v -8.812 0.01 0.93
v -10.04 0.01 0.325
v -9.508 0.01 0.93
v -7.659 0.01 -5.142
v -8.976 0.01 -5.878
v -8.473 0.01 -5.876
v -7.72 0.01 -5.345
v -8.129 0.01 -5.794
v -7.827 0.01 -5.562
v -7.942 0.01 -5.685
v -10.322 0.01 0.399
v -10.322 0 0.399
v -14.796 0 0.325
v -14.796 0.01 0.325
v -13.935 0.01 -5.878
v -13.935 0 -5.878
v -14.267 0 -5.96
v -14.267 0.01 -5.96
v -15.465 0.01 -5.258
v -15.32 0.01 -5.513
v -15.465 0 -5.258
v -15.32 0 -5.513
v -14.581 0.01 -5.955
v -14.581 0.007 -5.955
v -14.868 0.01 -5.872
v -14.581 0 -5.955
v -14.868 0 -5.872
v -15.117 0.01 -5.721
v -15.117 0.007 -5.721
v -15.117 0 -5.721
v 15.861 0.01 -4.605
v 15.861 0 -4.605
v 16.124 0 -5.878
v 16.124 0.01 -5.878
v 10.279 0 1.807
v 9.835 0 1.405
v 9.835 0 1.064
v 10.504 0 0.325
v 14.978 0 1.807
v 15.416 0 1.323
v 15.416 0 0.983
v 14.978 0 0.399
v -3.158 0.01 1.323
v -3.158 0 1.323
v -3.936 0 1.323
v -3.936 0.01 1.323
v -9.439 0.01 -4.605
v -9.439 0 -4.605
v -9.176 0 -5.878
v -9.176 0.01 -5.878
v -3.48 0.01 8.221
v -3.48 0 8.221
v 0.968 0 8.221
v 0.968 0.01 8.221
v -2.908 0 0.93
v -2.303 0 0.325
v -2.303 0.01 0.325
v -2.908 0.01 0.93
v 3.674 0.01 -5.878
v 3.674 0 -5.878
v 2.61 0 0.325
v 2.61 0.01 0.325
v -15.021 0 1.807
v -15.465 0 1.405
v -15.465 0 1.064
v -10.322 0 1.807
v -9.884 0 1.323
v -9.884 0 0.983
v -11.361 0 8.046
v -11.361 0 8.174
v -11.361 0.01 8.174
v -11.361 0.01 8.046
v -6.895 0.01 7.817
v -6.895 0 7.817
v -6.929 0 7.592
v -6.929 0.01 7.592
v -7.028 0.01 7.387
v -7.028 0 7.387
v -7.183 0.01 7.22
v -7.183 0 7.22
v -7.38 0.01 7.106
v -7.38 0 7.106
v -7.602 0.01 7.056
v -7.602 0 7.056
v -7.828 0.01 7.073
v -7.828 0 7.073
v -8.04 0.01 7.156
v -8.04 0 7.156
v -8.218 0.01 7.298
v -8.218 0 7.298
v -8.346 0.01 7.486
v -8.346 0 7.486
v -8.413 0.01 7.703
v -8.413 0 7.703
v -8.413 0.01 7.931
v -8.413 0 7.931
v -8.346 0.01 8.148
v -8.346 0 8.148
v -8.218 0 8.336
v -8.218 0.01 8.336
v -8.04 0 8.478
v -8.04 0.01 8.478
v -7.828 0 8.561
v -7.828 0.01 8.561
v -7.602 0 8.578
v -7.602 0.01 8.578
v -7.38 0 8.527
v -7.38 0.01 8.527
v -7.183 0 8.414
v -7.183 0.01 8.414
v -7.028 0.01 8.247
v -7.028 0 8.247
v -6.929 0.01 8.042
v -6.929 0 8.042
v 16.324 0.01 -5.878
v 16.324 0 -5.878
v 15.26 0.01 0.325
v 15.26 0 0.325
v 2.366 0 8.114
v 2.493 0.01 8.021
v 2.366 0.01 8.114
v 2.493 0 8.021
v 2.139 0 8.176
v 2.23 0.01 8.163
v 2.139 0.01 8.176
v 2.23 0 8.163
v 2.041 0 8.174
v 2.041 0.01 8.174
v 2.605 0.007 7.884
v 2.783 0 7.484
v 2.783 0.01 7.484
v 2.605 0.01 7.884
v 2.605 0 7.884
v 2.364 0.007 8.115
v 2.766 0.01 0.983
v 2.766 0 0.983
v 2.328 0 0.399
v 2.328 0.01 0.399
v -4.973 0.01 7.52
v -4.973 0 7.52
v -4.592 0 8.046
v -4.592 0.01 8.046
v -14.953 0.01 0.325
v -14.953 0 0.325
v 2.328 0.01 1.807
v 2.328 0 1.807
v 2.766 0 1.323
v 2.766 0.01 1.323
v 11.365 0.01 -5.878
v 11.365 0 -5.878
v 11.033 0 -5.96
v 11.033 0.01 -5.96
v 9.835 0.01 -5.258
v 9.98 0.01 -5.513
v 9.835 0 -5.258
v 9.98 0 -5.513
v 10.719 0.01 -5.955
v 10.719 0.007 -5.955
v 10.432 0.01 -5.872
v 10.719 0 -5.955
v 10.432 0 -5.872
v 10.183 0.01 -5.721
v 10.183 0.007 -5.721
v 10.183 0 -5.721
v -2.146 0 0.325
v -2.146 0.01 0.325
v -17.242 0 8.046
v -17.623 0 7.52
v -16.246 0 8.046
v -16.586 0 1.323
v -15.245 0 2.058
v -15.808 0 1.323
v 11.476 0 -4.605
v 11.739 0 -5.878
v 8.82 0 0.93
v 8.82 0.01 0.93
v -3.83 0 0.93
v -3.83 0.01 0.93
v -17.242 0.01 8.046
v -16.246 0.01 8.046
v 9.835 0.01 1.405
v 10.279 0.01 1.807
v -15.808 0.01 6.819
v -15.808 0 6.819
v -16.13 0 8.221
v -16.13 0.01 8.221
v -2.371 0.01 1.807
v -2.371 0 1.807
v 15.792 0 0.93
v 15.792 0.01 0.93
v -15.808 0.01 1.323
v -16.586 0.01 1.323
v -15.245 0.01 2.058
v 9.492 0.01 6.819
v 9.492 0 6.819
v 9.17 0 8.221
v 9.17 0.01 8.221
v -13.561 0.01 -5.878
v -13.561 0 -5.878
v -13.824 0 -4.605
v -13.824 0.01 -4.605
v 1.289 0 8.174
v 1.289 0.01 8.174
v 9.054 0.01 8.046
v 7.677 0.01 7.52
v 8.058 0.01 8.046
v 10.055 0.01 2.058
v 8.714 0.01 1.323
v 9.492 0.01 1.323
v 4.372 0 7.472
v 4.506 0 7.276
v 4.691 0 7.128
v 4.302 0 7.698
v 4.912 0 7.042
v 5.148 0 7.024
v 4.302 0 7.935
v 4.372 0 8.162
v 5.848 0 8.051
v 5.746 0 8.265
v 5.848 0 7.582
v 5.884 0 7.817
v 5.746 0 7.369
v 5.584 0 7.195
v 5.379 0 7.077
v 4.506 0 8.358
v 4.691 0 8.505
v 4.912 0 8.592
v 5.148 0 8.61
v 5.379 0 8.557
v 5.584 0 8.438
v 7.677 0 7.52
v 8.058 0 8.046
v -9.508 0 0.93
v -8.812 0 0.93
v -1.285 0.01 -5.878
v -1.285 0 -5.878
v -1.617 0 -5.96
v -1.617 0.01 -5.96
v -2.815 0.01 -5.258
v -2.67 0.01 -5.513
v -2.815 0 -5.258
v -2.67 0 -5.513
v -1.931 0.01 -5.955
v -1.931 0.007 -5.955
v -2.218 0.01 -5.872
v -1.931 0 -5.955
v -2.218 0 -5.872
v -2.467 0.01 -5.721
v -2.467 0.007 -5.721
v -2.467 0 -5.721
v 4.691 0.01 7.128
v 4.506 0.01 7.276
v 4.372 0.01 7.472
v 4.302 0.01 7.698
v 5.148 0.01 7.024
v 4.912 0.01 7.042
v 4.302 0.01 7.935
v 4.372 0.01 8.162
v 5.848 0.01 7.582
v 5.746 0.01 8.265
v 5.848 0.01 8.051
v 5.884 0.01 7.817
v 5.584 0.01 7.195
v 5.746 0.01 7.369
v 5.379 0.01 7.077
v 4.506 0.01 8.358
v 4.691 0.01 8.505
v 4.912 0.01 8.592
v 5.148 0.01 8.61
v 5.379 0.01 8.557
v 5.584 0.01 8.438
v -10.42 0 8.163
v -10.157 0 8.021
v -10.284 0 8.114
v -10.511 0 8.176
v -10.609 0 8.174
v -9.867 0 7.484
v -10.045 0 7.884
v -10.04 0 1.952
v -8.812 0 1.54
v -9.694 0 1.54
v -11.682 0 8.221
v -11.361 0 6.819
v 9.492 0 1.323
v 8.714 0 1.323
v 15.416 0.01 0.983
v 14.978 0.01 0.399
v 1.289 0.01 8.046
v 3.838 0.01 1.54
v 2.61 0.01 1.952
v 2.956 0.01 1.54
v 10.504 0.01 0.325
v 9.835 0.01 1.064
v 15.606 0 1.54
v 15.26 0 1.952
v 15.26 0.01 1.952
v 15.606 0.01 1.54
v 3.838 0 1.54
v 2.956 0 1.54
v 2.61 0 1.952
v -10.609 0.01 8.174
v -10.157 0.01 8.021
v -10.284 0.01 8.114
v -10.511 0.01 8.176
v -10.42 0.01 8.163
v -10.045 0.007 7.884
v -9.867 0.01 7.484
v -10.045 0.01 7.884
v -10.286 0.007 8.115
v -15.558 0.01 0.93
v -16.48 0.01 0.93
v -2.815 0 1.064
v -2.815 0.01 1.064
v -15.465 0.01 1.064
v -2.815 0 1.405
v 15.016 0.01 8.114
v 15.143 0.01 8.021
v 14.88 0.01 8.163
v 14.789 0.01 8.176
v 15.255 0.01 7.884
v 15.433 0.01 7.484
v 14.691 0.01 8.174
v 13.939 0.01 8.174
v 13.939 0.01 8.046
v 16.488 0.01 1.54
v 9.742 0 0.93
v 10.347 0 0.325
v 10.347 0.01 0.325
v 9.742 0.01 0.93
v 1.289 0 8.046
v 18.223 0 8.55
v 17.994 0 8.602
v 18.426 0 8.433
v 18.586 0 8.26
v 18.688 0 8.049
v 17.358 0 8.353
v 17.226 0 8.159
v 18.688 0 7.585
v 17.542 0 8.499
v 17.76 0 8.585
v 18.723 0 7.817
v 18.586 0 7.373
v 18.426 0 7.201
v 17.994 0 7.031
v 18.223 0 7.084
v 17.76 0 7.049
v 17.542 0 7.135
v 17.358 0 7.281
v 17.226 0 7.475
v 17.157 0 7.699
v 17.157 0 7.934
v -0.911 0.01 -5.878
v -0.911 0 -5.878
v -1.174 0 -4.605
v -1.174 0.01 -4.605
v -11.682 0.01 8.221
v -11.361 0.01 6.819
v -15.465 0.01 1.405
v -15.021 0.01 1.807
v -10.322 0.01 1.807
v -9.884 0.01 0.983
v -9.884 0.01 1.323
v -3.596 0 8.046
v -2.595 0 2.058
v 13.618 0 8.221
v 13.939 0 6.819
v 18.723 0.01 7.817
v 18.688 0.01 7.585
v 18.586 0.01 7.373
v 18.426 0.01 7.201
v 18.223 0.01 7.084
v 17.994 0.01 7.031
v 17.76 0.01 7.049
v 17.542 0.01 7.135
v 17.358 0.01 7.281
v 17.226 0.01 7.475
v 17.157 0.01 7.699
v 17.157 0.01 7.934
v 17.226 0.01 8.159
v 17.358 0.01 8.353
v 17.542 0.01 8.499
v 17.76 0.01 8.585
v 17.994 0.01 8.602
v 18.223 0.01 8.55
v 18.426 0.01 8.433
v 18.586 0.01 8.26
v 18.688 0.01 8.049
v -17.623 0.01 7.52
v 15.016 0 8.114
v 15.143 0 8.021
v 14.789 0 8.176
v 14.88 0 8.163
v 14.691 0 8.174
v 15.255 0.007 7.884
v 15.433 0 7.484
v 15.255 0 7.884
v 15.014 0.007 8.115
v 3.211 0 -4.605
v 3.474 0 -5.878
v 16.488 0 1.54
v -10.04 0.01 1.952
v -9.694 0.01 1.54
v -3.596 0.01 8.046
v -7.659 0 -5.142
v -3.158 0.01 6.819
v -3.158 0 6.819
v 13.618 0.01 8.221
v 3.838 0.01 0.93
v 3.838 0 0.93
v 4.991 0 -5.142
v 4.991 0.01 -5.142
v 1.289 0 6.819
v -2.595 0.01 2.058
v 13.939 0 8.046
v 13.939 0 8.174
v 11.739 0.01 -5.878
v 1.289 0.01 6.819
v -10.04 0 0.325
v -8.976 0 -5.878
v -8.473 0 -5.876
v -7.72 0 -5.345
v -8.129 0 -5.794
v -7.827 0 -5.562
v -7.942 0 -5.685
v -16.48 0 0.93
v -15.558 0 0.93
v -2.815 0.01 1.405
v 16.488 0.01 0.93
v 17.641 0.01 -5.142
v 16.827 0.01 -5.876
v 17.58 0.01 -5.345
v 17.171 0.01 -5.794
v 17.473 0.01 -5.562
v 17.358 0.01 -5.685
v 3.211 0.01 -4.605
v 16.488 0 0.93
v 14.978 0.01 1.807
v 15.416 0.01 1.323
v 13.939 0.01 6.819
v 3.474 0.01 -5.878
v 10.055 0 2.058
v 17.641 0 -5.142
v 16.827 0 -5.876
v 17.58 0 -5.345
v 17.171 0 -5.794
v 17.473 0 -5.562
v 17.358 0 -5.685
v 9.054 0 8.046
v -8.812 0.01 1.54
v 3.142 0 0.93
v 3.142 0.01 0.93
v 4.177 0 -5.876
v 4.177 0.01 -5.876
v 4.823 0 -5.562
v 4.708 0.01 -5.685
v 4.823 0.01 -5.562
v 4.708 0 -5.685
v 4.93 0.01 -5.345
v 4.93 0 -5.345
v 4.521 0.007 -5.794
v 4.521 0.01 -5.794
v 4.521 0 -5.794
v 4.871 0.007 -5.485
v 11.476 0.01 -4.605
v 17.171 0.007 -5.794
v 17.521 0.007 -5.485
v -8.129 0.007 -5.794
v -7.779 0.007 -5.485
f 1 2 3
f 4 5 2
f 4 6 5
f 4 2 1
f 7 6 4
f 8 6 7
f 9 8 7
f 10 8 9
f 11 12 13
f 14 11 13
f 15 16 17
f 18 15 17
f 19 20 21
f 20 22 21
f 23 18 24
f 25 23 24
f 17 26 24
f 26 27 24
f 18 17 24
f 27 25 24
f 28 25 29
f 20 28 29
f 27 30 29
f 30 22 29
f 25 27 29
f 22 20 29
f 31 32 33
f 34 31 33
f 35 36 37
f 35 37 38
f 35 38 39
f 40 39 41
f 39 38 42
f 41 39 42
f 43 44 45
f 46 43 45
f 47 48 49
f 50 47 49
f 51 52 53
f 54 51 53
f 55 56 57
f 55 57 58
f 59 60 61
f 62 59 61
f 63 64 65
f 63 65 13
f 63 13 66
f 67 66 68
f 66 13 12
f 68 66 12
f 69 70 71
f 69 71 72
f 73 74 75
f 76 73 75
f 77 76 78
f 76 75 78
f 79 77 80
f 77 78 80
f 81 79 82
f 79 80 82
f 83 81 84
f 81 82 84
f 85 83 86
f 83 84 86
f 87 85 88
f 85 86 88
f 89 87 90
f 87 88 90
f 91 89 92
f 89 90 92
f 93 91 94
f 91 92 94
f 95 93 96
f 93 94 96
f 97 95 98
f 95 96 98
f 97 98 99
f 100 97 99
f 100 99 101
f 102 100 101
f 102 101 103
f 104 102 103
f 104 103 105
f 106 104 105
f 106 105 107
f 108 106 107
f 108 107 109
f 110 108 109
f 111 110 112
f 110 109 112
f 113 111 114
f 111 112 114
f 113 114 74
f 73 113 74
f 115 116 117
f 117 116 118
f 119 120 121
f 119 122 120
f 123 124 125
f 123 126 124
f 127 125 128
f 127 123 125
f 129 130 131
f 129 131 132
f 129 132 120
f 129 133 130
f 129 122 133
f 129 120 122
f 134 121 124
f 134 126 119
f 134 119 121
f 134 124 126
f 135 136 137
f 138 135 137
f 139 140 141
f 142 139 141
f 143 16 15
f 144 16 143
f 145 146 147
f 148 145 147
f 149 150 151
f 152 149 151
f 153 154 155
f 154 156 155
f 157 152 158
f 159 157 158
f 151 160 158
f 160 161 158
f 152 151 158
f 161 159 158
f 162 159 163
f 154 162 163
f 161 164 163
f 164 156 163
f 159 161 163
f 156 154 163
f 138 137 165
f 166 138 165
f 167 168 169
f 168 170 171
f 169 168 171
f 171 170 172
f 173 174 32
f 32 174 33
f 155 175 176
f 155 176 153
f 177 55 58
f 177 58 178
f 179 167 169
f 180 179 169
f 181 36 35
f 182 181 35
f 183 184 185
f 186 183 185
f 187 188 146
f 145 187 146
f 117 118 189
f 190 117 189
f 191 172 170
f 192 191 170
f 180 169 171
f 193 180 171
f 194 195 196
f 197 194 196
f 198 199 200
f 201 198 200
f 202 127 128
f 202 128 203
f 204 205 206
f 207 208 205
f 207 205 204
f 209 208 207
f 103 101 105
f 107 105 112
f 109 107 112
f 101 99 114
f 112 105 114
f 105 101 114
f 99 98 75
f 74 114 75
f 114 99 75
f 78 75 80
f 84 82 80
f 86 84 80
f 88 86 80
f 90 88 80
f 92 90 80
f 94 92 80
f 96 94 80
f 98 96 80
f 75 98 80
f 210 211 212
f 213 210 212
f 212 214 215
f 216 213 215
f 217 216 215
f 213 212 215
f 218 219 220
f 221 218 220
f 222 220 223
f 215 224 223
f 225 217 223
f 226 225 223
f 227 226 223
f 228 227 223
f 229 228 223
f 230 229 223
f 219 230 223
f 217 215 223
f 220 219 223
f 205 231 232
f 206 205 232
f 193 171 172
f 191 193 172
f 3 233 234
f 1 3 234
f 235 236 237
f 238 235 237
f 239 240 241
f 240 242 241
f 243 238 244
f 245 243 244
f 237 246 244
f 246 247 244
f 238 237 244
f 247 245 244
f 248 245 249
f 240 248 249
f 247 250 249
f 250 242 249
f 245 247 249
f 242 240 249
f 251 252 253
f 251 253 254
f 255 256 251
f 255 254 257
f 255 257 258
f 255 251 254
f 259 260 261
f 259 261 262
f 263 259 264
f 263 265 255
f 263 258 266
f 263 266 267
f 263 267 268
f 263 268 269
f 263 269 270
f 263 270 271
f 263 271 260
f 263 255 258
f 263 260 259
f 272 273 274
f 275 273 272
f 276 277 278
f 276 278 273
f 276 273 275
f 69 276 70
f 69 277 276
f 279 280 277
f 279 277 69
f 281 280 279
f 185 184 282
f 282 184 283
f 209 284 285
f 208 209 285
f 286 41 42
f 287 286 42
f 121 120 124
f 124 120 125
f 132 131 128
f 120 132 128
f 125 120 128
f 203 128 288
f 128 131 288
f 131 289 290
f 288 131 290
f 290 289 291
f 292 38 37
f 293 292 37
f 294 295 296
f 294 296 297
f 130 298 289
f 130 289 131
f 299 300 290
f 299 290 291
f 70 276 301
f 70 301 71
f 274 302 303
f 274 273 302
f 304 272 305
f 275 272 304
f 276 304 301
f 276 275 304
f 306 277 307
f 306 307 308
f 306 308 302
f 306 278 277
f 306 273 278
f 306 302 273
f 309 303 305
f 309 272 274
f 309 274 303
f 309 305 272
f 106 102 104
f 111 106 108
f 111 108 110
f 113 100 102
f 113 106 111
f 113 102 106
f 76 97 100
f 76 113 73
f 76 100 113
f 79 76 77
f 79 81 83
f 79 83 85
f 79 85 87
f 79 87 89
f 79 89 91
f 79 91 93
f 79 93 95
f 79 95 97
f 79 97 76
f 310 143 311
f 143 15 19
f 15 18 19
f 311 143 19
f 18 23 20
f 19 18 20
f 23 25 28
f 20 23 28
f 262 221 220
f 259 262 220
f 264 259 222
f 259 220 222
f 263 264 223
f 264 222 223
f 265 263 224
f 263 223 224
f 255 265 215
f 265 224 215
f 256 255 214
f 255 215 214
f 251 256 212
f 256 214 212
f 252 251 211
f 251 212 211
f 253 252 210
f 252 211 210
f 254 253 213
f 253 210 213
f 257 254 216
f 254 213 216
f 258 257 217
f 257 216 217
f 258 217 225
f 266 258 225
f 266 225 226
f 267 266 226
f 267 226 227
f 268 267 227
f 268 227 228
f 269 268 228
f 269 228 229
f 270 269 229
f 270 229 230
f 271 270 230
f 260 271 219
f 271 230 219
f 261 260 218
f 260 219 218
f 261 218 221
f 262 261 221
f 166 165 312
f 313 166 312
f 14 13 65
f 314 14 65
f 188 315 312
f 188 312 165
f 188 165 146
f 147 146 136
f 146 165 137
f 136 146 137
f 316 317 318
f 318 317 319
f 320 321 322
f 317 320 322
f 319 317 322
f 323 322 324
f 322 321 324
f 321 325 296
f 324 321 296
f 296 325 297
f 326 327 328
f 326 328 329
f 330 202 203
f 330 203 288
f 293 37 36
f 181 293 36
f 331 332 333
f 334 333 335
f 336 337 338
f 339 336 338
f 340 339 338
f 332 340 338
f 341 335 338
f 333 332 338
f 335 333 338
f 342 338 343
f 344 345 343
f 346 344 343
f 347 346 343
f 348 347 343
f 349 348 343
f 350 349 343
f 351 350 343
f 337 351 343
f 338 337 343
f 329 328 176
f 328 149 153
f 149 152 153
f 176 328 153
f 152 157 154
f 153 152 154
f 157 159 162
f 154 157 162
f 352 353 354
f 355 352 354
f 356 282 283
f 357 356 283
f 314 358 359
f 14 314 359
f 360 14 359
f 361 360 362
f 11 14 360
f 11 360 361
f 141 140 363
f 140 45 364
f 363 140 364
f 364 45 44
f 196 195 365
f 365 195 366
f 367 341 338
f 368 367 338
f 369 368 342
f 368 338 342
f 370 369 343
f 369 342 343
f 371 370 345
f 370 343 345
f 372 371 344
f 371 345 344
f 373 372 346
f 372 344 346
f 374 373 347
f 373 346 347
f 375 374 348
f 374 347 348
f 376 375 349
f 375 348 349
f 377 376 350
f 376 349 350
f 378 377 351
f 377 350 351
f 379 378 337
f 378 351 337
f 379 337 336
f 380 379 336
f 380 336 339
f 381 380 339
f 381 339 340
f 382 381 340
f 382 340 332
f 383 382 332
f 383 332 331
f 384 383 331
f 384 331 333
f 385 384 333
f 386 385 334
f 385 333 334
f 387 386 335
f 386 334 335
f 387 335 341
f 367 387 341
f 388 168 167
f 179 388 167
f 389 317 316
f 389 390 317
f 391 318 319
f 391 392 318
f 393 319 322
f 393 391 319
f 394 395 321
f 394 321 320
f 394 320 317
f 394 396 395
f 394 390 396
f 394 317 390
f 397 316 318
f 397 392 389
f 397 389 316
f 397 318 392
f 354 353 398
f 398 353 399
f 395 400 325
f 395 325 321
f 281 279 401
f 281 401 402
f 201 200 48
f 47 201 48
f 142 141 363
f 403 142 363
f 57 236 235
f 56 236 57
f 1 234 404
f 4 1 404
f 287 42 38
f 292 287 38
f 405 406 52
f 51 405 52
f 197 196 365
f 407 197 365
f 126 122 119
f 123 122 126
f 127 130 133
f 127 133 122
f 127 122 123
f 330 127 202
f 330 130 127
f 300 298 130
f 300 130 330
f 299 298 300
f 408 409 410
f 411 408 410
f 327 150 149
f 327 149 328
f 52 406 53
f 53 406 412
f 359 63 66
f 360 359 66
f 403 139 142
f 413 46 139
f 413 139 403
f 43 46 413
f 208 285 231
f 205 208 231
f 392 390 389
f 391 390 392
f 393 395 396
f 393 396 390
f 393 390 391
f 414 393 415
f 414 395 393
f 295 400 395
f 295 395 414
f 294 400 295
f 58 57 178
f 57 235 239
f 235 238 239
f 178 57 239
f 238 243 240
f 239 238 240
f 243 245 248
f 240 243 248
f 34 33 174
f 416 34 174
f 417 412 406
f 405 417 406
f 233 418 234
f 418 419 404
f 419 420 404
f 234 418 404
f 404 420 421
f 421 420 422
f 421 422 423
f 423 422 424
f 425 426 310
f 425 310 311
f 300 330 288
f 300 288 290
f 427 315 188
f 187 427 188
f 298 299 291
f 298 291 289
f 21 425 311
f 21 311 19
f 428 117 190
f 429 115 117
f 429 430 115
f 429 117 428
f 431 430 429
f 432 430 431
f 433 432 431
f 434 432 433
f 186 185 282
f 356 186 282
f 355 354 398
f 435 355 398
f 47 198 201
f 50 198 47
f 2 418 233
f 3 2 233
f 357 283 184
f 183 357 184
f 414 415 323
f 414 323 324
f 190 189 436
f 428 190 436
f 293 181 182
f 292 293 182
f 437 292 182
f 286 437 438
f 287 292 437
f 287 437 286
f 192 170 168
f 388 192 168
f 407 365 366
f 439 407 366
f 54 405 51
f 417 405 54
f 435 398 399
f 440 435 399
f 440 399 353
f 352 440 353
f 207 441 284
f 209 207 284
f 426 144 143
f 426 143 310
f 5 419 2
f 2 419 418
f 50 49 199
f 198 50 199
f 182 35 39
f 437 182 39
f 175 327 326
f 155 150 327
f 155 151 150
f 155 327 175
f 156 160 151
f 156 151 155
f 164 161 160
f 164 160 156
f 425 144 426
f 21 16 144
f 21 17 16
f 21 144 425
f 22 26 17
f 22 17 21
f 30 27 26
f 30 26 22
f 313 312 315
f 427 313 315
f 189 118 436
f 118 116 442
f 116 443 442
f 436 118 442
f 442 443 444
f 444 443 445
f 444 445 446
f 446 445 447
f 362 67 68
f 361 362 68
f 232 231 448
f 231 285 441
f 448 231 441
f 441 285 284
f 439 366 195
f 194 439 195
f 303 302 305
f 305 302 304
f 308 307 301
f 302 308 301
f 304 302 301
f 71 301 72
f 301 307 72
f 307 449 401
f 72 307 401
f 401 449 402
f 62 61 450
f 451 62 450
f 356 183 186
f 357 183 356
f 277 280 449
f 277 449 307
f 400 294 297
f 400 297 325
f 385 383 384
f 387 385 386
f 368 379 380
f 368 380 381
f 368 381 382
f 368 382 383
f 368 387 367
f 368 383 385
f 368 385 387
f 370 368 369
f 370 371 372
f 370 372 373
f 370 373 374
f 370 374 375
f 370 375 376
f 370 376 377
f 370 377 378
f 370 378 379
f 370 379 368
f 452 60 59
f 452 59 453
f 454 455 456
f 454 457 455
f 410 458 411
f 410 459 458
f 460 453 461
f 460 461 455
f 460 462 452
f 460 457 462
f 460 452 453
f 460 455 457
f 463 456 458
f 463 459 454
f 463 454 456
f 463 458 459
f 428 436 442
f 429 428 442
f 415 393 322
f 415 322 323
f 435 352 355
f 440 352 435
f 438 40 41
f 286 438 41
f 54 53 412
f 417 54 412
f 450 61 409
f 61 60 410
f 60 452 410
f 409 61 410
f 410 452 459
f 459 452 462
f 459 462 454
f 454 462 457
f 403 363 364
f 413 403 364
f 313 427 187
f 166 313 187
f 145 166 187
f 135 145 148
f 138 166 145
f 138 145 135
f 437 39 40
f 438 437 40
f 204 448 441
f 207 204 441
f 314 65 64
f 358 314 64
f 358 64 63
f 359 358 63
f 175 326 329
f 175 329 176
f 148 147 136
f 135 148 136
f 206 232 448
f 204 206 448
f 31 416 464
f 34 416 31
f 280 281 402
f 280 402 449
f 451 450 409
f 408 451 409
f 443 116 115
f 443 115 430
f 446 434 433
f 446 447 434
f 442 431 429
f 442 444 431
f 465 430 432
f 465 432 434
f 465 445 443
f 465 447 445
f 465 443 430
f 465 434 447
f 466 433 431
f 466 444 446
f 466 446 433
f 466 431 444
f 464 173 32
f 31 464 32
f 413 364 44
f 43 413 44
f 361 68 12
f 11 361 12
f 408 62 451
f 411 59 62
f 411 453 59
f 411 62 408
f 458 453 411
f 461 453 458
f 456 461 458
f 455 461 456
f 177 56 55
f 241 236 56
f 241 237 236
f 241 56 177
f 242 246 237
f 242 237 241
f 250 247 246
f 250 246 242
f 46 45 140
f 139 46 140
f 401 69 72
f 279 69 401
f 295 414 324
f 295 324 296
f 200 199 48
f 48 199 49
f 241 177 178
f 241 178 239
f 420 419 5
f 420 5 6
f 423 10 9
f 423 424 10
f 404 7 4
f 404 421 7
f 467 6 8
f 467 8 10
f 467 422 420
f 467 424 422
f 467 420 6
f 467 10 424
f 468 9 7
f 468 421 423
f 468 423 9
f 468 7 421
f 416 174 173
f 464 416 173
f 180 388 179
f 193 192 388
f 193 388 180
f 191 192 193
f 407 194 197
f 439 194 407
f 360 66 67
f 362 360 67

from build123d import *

# Parameters (mm, degrees)
SKETCH_1_R         = 0.763393416
EXTRUDE_1_DEPTH    = 0.01
SKETCH_1_R_2       = 0.795135379
EXTRUDE_1_2_DEPTH  = 0.01
SKETCH_1_R_3       = 0.787595702
EXTRUDE_1_3_DEPTH  = 0.01
EXTRUDE_1_4_DEPTH  = 0.01
EXTRUDE_1_5_DEPTH  = 0.01
EXTRUDE_1_6_DEPTH  = 0.01
EXTRUDE_1_7_DEPTH  = 0.01
EXTRUDE_1_8_DEPTH  = 0.01
EXTRUDE_1_9_DEPTH  = 0.01
EXTRUDE_1_10_DEPTH = 0.01
EXTRUDE_1_11_DEPTH = 0.01
EXTRUDE_1_12_DEPTH = 0.01
EXTRUDE_1_13_DEPTH = 0.01
EXTRUDE_1_14_DEPTH = 0.01
EXTRUDE_1_15_DEPTH = 0.01
EXTRUDE_1_16_DEPTH = 0.01
EXTRUDE_1_17_DEPTH = 0.01
EXTRUDE_1_18_DEPTH = 0.01
EXTRUDE_1_19_DEPTH = 0.01
EXTRUDE_1_20_DEPTH = 0.01
EXTRUDE_1_21_DEPTH = 0.01
EXTRUDE_1_22_DEPTH = 0.01
EXTRUDE_1_23_DEPTH = 0.01
EXTRUDE_1_24_DEPTH = 0.01


with BuildPart() as part:
    # Эскиз1 → Бобышка-Вытянуть1 (new body)
    with BuildSketch(Plane(origin=(0, 0, 0), x_dir=(1, 0, 0), z_dir=(0, 1, 0))):
        with Locations((-7.658623661, -7.816825486)):
            Circle(SKETCH_1_R)
    extrude(amount=EXTRUDE_1_DEPTH)


with BuildPart() as body_2:
    # Эскиз1 → Extrude 1 2 (new body)
    with BuildSketch(Plane(origin=(0, 0, 0), x_dir=(1, 0, 0), z_dir=(0, 1, 0))):
        with Locations((5.088592522, -7.816825486)):
            Circle(SKETCH_1_R_2)
    extrude(amount=EXTRUDE_1_2_DEPTH)


with BuildPart() as body_3:
    # Эскиз1 → Extrude 1 3 (new body)
    with BuildSketch(Plane(origin=(0, 0, 0), x_dir=(1, 0, 0), z_dir=(0, 1, 0))):
        with Locations((17.935397742, -7.816825486)):
            Circle(SKETCH_1_R_3)
    extrude(amount=EXTRUDE_1_3_DEPTH)


with BuildPart() as body_4:
    # Эскиз1 → Extrude 1 4 (new body)
    with BuildSketch(Plane(origin=(0, 0, 0), x_dir=(1, 0, 0), z_dir=(0, 1, 0))):
        with BuildLine():
            Line((-13.935399211, 5.877538867), (-14.953301559, -0.325303568))
            Line((-14.953301559, -0.325303568), (-15.557681079, -0.929683087))
            Line((-15.557681079, -0.929683087), (-16.480155082, -0.929683087))
            Line((-16.480155082, -0.929683087), (-15.464755195, 5.257909972))
            add(Edge.make_bspline(
                [(-13.935399211, 5.877538867), (-14.610385894, 6.138464398), (-15.237764212, 5.808302619), (-15.464755195, 5.257909972)],
                knots=[0, 0, 0, 0, 0.625517952, 0.625517952, 0.625517952, 0.625517952], degree=3))
        make_face()
    extrude(amount=EXTRUDE_1_4_DEPTH)


with BuildPart() as body_5:
    # Эскиз1 → Extrude 1 5 (new body)
    with BuildSketch(Plane(origin=(0, 0, 0), x_dir=(1, 0, 0), z_dir=(0, 1, 0))):
        Polygon((-13.561115101, 5.877538867), (-13.824242392, 4.605386618), (-9.438787541, 4.605386618), (-9.17566025, 5.877538867), align=None)
    extrude(amount=EXTRUDE_1_5_DEPTH)


with BuildPart() as body_6:
    # Эскиз1 → Extrude 1 6 (new body)
    with BuildSketch(Plane(origin=(0, 0, 0), x_dir=(1, 0, 0), z_dir=(0, 1, 0))):
        with BuildLine():
            Line((-8.976485421, 5.877538867), (-10.03976025, -0.325303568))
            Line((-10.03976025, -0.325303568), (-9.508122835, -0.929683087))
            Line((-9.508122835, -0.929683087), (-8.811752701, -0.929683087))
            Line((-8.811752701, -0.929683087), (-7.658623661, 5.142464503))
            add(Edge.make_bspline(
                [(-8.976485421, 5.877538867), (-7.789751397, 5.971425454), (-7.75409694, 5.437036419), (-7.658623661, 5.142464503)],
                knots=[0, 0, 0, 0, 0.49785116, 0.49785116, 0.49785116, 0.49785116], degree=3))
        make_face()
    extrude(amount=EXTRUDE_1_6_DEPTH)


with BuildPart() as body_7:
    # Эскиз1 → Extrude 1 7 (new body)
    with BuildSketch(Plane(origin=(0, 0, 0), x_dir=(1, 0, 0), z_dir=(0, 1, 0))):
        Polygon((-14.796386627, -0.325303568), (-15.464755195, -1.063631941), (-15.464755195, -1.404679905), (-15.020783216, -1.80658362), (-10.321650339, -1.80658362), (-9.883798455, -1.322900686), (-9.883798455, -0.982748319), (-10.321650339, -0.398715582), align=None)
    extrude(amount=EXTRUDE_1_7_DEPTH)


with BuildPart() as body_8:
    # Эскиз1 → Extrude 1 8 (new body)
    with BuildSketch(Plane(origin=(0, 0, 0), x_dir=(1, 0, 0), z_dir=(0, 1, 0))):
        Polygon((-15.808102822, -6.819203912), (-16.129603618, -8.221304608), (-11.682175934, -8.221304608), (-11.360675138, -6.819203912), align=None)
    extrude(amount=EXTRUDE_1_8_DEPTH)


with BuildPart() as body_9:
    # Эскиз1 → Extrude 1 9 (new body)
    with BuildSketch(Plane(origin=(0, 0, 0), x_dir=(1, 0, 0), z_dir=(0, 1, 0))):
        Polygon((-16.586311426, -1.322900686), (-17.623147785, -7.52025426), (-17.241957947, -8.046322143), (-16.246337063, -8.046322143), (-15.244523196, -2.058304174), (-15.808102822, -1.322900686), align=None)
    extrude(amount=EXTRUDE_1_9_DEPTH)


with BuildPart() as body_10:
    # Эскиз1 → Extrude 1 10 (new body)
    with BuildSketch(Plane(origin=(0, 0, 0), x_dir=(1, 0, 0), z_dir=(0, 1, 0))):
        with BuildLine():
            Line((-11.360675138, -8.046322143), (-10.03976025, -1.951571019))
            Line((-10.03976025, -1.951571019), (-9.694399155, -1.539885994))
            Line((-9.694399155, -1.539885994), (-8.811752701, -1.539885994))
            Line((-8.811752701, -1.539885994), (-9.867079703, -7.484095747))
            add(Edge.make_bspline(
                [(-9.867079703, -7.484095747), (-10.019377597, -7.965932222), (-10.239517084, -8.203702703), (-10.608927288, -8.174149887)],
                knots=[0, 0, 0, 0, 1, 1, 1, 1], degree=3))
            Line((-10.608927288, -8.174149887), (-11.360675138, -8.174149887))
            Line((-11.360675138, -8.174149887), (-11.360675138, -8.046322143))
        make_face()
    extrude(amount=EXTRUDE_1_10_DEPTH)


with BuildPart() as body_11:
    # Эскиз1 → Extrude 1 11 (new body)
    with BuildSketch(Plane(origin=(0, 0, 0), x_dir=(1, 0, 0), z_dir=(0, 1, 0))):
        with BuildLine():
            Line((-1.285399211, 5.877538867), (-2.303301559, -0.325303568))
            Line((-2.303301559, -0.325303568), (-2.907681079, -0.929683087))
            Line((-2.907681079, -0.929683087), (-3.830155082, -0.929683087))
            Line((-3.830155082, -0.929683087), (-2.814755195, 5.257909972))
            add(Edge.make_bspline(
                [(-1.285399211, 5.877538867), (-1.960385894, 6.138464398), (-2.587764212, 5.808302619), (-2.814755195, 5.257909972)],
                knots=[0, 0, 0, 0, 0.625517952, 0.625517952, 0.625517952, 0.625517952], degree=3))
        make_face()
    extrude(amount=EXTRUDE_1_11_DEPTH)


with BuildPart() as body_12:
    # Эскиз1 → Extrude 1 12 (new body)
    with BuildSketch(Plane(origin=(0, 0, 0), x_dir=(1, 0, 0), z_dir=(0, 1, 0))):
        Polygon((-0.911115101, 5.877538867), (-1.174242392, 4.605386618), (3.211212459, 4.605386618), (3.47433975, 5.877538867), align=None)
    extrude(amount=EXTRUDE_1_12_DEPTH)


with BuildPart() as body_13:
    # Эскиз1 → Extrude 1 13 (new body)
    with BuildSketch(Plane(origin=(0, 0, 0), x_dir=(1, 0, 0), z_dir=(0, 1, 0))):
        with BuildLine():
            Line((3.673514579, 5.877538867), (2.61023975, -0.325303568))
            Line((2.61023975, -0.325303568), (3.141877165, -0.929683087))
            Line((3.141877165, -0.929683087), (3.838247299, -0.929683087))
            Line((3.838247299, -0.929683087), (4.991376339, 5.142464503))
            add(Edge.make_bspline(
                [(3.673514579, 5.877538867), (4.860248603, 5.971425454), (4.89590306, 5.437036419), (4.991376339, 5.142464503)],
                knots=[0, 0, 0, 0, 0.49785116, 0.49785116, 0.49785116, 0.49785116], degree=3))
        make_face()
    extrude(amount=EXTRUDE_1_13_DEPTH)


with BuildPart() as body_14:
    # Эскиз1 → Extrude 1 14 (new body)
    with BuildSketch(Plane(origin=(0, 0, 0), x_dir=(1, 0, 0), z_dir=(0, 1, 0))):
        Polygon((-2.146386627, -0.325303568), (-2.814755195, -1.063631941), (-2.814755195, -1.404679905), (-2.370783216, -1.80658362), (2.328349661, -1.80658362), (2.766201545, -1.322900686), (2.766201545, -0.982748319), (2.328349661, -0.398715582), align=None)
    extrude(amount=EXTRUDE_1_14_DEPTH)


with BuildPart() as body_15:
    # Эскиз1 → Extrude 1 15 (new body)
    with BuildSketch(Plane(origin=(0, 0, 0), x_dir=(1, 0, 0), z_dir=(0, 1, 0))):
        Polygon((-3.158102822, -6.819203912), (-3.479603618, -8.221304608), (0.967824066, -8.221304608), (1.289324862, -6.819203912), align=None)
    extrude(amount=EXTRUDE_1_15_DEPTH)


with BuildPart() as body_16:
    # Эскиз1 → Extrude 1 16 (new body)
    with BuildSketch(Plane(origin=(0, 0, 0), x_dir=(1, 0, 0), z_dir=(0, 1, 0))):
        Polygon((-3.936311426, -1.322900686), (-4.973147785, -7.52025426), (-4.591957947, -8.046322143), (-3.596337063, -8.046322143), (-2.594523196, -2.058304174), (-3.158102822, -1.322900686), align=None)
    extrude(amount=EXTRUDE_1_16_DEPTH)


with BuildPart() as body_17:
    # Эскиз1 → Extrude 1 17 (new body)
    with BuildSketch(Plane(origin=(0, 0, 0), x_dir=(1, 0, 0), z_dir=(0, 1, 0))):
        with BuildLine():
            Line((1.289324862, -8.046322143), (2.61023975, -1.951571019))
            Line((2.61023975, -1.951571019), (2.955600845, -1.539885994))
            Line((2.955600845, -1.539885994), (3.838247299, -1.539885994))
            Line((3.838247299, -1.539885994), (2.782920297, -7.484095747))
            add(Edge.make_bspline(
                [(2.782920297, -7.484095747), (2.630622403, -7.965932222), (2.410482916, -8.203702703), (2.041072712, -8.174149887)],
                knots=[0, 0, 0, 0, 1, 1, 1, 1], degree=3))
            Line((2.041072712, -8.174149887), (1.289324862, -8.174149887))
            Line((1.289324862, -8.174149887), (1.289324862, -8.046322143))
        make_face()
    extrude(amount=EXTRUDE_1_17_DEPTH)


with BuildPart() as body_18:
    # Эскиз1 → Extrude 1 18 (new body)
    with BuildSketch(Plane(origin=(0, 0, 0), x_dir=(1, 0, 0), z_dir=(0, 1, 0))):
        with BuildLine():
            Line((11.364600789, 5.877538867), (10.346698441, -0.325303568))
            Line((10.346698441, -0.325303568), (9.742318921, -0.929683087))
            Line((9.742318921, -0.929683087), (8.819844918, -0.929683087))
            Line((8.819844918, -0.929683087), (9.835244805, 5.257909972))
            add(Edge.make_bspline(
                [(11.364600789, 5.877538867), (10.689614106, 6.138464398), (10.062235788, 5.808302619), (9.835244805, 5.257909972)],
                knots=[0, 0, 0, 0, 0.625517952, 0.625517952, 0.625517952, 0.625517952], degree=3))
        make_face()
    extrude(amount=EXTRUDE_1_18_DEPTH)


with BuildPart() as body_19:
    # Эскиз1 → Extrude 1 19 (new body)
    with BuildSketch(Plane(origin=(0, 0, 0), x_dir=(1, 0, 0), z_dir=(0, 1, 0))):
        Polygon((11.738884899, 5.877538867), (11.475757608, 4.605386618), (15.861212459, 4.605386618), (16.12433975, 5.877538867), align=None)
    extrude(amount=EXTRUDE_1_19_DEPTH)


with BuildPart() as body_20:
    # Эскиз1 → Extrude 1 20 (new body)
    with BuildSketch(Plane(origin=(0, 0, 0), x_dir=(1, 0, 0), z_dir=(0, 1, 0))):
        with BuildLine():
            Line((16.323514579, 5.877538867), (15.26023975, -0.325303568))
            Line((15.26023975, -0.325303568), (15.791877165, -0.929683087))
            Line((15.791877165, -0.929683087), (16.488247299, -0.929683087))
            Line((16.488247299, -0.929683087), (17.641376339, 5.142464503))
            add(Edge.make_bspline(
                [(16.323514579, 5.877538867), (17.510248603, 5.971425454), (17.54590306, 5.437036419), (17.641376339, 5.142464503)],
                knots=[0, 0, 0, 0, 0.49785116, 0.49785116, 0.49785116, 0.49785116], degree=3))
        make_face()
    extrude(amount=EXTRUDE_1_20_DEPTH)


with BuildPart() as body_21:
    # Эскиз1 → Extrude 1 21 (new body)
    with BuildSketch(Plane(origin=(0, 0, 0), x_dir=(1, 0, 0), z_dir=(0, 1, 0))):
        Polygon((10.503613373, -0.325303568), (9.835244805, -1.063631941), (9.835244805, -1.404679905), (10.279216784, -1.80658362), (14.978349661, -1.80658362), (15.416201545, -1.322900686), (15.416201545, -0.982748319), (14.978349661, -0.398715582), align=None)
    extrude(amount=EXTRUDE_1_21_DEPTH)


with BuildPart() as body_22:
    # Эскиз1 → Extrude 1 22 (new body)
    with BuildSketch(Plane(origin=(0, 0, 0), x_dir=(1, 0, 0), z_dir=(0, 1, 0))):
        Polygon((9.491897178, -6.819203912), (9.170396382, -8.221304608), (13.617824066, -8.221304608), (13.939324862, -6.819203912), align=None)
    extrude(amount=EXTRUDE_1_22_DEPTH)


with BuildPart() as body_23:
    # Эскиз1 → Extrude 1 23 (new body)
    with BuildSketch(Plane(origin=(0, 0, 0), x_dir=(1, 0, 0), z_dir=(0, 1, 0))):
        Polygon((8.713688574, -1.322900686), (7.676852215, -7.52025426), (8.058042053, -8.046322143), (9.053662937, -8.046322143), (10.055476804, -2.058304174), (9.491897178, -1.322900686), align=None)
    extrude(amount=EXTRUDE_1_23_DEPTH)


with BuildPart() as body_24:
    # Эскиз1 → Extrude 1 24 (new body)
    with BuildSketch(Plane(origin=(0, 0, 0), x_dir=(1, 0, 0), z_dir=(0, 1, 0))):
        with BuildLine():
            Line((13.939324862, -8.046322143), (15.26023975, -1.951571019))
            Line((15.26023975, -1.951571019), (15.605600845, -1.539885994))
            Line((15.605600845, -1.539885994), (16.488247299, -1.539885994))
            Line((16.488247299, -1.539885994), (15.432920297, -7.484095747))
            add(Edge.make_bspline(
                [(15.432920297, -7.484095747), (15.280622403, -7.965932222), (15.060482916, -8.203702703), (14.691072712, -8.174149887)],
                knots=[0, 0, 0, 0, 1, 1, 1, 1], degree=3))
            Line((14.691072712, -8.174149887), (13.939324862, -8.174149887))
            Line((13.939324862, -8.174149887), (13.939324862, -8.046322143))
        make_face()
    extrude(amount=EXTRUDE_1_24_DEPTH)


solid = Compound([part.part, body_2.part, body_3.part, body_4.part, body_5.part, body_6.part, body_7.part, body_8.part, body_9.part, body_10.part, body_11.part, body_12.part, body_13.part, body_14.part, body_15.part, body_16.part, body_17.part, body_18.part, body_19.part, body_20.part, body_21.part, body_22.part, body_23.part, body_24.part])
